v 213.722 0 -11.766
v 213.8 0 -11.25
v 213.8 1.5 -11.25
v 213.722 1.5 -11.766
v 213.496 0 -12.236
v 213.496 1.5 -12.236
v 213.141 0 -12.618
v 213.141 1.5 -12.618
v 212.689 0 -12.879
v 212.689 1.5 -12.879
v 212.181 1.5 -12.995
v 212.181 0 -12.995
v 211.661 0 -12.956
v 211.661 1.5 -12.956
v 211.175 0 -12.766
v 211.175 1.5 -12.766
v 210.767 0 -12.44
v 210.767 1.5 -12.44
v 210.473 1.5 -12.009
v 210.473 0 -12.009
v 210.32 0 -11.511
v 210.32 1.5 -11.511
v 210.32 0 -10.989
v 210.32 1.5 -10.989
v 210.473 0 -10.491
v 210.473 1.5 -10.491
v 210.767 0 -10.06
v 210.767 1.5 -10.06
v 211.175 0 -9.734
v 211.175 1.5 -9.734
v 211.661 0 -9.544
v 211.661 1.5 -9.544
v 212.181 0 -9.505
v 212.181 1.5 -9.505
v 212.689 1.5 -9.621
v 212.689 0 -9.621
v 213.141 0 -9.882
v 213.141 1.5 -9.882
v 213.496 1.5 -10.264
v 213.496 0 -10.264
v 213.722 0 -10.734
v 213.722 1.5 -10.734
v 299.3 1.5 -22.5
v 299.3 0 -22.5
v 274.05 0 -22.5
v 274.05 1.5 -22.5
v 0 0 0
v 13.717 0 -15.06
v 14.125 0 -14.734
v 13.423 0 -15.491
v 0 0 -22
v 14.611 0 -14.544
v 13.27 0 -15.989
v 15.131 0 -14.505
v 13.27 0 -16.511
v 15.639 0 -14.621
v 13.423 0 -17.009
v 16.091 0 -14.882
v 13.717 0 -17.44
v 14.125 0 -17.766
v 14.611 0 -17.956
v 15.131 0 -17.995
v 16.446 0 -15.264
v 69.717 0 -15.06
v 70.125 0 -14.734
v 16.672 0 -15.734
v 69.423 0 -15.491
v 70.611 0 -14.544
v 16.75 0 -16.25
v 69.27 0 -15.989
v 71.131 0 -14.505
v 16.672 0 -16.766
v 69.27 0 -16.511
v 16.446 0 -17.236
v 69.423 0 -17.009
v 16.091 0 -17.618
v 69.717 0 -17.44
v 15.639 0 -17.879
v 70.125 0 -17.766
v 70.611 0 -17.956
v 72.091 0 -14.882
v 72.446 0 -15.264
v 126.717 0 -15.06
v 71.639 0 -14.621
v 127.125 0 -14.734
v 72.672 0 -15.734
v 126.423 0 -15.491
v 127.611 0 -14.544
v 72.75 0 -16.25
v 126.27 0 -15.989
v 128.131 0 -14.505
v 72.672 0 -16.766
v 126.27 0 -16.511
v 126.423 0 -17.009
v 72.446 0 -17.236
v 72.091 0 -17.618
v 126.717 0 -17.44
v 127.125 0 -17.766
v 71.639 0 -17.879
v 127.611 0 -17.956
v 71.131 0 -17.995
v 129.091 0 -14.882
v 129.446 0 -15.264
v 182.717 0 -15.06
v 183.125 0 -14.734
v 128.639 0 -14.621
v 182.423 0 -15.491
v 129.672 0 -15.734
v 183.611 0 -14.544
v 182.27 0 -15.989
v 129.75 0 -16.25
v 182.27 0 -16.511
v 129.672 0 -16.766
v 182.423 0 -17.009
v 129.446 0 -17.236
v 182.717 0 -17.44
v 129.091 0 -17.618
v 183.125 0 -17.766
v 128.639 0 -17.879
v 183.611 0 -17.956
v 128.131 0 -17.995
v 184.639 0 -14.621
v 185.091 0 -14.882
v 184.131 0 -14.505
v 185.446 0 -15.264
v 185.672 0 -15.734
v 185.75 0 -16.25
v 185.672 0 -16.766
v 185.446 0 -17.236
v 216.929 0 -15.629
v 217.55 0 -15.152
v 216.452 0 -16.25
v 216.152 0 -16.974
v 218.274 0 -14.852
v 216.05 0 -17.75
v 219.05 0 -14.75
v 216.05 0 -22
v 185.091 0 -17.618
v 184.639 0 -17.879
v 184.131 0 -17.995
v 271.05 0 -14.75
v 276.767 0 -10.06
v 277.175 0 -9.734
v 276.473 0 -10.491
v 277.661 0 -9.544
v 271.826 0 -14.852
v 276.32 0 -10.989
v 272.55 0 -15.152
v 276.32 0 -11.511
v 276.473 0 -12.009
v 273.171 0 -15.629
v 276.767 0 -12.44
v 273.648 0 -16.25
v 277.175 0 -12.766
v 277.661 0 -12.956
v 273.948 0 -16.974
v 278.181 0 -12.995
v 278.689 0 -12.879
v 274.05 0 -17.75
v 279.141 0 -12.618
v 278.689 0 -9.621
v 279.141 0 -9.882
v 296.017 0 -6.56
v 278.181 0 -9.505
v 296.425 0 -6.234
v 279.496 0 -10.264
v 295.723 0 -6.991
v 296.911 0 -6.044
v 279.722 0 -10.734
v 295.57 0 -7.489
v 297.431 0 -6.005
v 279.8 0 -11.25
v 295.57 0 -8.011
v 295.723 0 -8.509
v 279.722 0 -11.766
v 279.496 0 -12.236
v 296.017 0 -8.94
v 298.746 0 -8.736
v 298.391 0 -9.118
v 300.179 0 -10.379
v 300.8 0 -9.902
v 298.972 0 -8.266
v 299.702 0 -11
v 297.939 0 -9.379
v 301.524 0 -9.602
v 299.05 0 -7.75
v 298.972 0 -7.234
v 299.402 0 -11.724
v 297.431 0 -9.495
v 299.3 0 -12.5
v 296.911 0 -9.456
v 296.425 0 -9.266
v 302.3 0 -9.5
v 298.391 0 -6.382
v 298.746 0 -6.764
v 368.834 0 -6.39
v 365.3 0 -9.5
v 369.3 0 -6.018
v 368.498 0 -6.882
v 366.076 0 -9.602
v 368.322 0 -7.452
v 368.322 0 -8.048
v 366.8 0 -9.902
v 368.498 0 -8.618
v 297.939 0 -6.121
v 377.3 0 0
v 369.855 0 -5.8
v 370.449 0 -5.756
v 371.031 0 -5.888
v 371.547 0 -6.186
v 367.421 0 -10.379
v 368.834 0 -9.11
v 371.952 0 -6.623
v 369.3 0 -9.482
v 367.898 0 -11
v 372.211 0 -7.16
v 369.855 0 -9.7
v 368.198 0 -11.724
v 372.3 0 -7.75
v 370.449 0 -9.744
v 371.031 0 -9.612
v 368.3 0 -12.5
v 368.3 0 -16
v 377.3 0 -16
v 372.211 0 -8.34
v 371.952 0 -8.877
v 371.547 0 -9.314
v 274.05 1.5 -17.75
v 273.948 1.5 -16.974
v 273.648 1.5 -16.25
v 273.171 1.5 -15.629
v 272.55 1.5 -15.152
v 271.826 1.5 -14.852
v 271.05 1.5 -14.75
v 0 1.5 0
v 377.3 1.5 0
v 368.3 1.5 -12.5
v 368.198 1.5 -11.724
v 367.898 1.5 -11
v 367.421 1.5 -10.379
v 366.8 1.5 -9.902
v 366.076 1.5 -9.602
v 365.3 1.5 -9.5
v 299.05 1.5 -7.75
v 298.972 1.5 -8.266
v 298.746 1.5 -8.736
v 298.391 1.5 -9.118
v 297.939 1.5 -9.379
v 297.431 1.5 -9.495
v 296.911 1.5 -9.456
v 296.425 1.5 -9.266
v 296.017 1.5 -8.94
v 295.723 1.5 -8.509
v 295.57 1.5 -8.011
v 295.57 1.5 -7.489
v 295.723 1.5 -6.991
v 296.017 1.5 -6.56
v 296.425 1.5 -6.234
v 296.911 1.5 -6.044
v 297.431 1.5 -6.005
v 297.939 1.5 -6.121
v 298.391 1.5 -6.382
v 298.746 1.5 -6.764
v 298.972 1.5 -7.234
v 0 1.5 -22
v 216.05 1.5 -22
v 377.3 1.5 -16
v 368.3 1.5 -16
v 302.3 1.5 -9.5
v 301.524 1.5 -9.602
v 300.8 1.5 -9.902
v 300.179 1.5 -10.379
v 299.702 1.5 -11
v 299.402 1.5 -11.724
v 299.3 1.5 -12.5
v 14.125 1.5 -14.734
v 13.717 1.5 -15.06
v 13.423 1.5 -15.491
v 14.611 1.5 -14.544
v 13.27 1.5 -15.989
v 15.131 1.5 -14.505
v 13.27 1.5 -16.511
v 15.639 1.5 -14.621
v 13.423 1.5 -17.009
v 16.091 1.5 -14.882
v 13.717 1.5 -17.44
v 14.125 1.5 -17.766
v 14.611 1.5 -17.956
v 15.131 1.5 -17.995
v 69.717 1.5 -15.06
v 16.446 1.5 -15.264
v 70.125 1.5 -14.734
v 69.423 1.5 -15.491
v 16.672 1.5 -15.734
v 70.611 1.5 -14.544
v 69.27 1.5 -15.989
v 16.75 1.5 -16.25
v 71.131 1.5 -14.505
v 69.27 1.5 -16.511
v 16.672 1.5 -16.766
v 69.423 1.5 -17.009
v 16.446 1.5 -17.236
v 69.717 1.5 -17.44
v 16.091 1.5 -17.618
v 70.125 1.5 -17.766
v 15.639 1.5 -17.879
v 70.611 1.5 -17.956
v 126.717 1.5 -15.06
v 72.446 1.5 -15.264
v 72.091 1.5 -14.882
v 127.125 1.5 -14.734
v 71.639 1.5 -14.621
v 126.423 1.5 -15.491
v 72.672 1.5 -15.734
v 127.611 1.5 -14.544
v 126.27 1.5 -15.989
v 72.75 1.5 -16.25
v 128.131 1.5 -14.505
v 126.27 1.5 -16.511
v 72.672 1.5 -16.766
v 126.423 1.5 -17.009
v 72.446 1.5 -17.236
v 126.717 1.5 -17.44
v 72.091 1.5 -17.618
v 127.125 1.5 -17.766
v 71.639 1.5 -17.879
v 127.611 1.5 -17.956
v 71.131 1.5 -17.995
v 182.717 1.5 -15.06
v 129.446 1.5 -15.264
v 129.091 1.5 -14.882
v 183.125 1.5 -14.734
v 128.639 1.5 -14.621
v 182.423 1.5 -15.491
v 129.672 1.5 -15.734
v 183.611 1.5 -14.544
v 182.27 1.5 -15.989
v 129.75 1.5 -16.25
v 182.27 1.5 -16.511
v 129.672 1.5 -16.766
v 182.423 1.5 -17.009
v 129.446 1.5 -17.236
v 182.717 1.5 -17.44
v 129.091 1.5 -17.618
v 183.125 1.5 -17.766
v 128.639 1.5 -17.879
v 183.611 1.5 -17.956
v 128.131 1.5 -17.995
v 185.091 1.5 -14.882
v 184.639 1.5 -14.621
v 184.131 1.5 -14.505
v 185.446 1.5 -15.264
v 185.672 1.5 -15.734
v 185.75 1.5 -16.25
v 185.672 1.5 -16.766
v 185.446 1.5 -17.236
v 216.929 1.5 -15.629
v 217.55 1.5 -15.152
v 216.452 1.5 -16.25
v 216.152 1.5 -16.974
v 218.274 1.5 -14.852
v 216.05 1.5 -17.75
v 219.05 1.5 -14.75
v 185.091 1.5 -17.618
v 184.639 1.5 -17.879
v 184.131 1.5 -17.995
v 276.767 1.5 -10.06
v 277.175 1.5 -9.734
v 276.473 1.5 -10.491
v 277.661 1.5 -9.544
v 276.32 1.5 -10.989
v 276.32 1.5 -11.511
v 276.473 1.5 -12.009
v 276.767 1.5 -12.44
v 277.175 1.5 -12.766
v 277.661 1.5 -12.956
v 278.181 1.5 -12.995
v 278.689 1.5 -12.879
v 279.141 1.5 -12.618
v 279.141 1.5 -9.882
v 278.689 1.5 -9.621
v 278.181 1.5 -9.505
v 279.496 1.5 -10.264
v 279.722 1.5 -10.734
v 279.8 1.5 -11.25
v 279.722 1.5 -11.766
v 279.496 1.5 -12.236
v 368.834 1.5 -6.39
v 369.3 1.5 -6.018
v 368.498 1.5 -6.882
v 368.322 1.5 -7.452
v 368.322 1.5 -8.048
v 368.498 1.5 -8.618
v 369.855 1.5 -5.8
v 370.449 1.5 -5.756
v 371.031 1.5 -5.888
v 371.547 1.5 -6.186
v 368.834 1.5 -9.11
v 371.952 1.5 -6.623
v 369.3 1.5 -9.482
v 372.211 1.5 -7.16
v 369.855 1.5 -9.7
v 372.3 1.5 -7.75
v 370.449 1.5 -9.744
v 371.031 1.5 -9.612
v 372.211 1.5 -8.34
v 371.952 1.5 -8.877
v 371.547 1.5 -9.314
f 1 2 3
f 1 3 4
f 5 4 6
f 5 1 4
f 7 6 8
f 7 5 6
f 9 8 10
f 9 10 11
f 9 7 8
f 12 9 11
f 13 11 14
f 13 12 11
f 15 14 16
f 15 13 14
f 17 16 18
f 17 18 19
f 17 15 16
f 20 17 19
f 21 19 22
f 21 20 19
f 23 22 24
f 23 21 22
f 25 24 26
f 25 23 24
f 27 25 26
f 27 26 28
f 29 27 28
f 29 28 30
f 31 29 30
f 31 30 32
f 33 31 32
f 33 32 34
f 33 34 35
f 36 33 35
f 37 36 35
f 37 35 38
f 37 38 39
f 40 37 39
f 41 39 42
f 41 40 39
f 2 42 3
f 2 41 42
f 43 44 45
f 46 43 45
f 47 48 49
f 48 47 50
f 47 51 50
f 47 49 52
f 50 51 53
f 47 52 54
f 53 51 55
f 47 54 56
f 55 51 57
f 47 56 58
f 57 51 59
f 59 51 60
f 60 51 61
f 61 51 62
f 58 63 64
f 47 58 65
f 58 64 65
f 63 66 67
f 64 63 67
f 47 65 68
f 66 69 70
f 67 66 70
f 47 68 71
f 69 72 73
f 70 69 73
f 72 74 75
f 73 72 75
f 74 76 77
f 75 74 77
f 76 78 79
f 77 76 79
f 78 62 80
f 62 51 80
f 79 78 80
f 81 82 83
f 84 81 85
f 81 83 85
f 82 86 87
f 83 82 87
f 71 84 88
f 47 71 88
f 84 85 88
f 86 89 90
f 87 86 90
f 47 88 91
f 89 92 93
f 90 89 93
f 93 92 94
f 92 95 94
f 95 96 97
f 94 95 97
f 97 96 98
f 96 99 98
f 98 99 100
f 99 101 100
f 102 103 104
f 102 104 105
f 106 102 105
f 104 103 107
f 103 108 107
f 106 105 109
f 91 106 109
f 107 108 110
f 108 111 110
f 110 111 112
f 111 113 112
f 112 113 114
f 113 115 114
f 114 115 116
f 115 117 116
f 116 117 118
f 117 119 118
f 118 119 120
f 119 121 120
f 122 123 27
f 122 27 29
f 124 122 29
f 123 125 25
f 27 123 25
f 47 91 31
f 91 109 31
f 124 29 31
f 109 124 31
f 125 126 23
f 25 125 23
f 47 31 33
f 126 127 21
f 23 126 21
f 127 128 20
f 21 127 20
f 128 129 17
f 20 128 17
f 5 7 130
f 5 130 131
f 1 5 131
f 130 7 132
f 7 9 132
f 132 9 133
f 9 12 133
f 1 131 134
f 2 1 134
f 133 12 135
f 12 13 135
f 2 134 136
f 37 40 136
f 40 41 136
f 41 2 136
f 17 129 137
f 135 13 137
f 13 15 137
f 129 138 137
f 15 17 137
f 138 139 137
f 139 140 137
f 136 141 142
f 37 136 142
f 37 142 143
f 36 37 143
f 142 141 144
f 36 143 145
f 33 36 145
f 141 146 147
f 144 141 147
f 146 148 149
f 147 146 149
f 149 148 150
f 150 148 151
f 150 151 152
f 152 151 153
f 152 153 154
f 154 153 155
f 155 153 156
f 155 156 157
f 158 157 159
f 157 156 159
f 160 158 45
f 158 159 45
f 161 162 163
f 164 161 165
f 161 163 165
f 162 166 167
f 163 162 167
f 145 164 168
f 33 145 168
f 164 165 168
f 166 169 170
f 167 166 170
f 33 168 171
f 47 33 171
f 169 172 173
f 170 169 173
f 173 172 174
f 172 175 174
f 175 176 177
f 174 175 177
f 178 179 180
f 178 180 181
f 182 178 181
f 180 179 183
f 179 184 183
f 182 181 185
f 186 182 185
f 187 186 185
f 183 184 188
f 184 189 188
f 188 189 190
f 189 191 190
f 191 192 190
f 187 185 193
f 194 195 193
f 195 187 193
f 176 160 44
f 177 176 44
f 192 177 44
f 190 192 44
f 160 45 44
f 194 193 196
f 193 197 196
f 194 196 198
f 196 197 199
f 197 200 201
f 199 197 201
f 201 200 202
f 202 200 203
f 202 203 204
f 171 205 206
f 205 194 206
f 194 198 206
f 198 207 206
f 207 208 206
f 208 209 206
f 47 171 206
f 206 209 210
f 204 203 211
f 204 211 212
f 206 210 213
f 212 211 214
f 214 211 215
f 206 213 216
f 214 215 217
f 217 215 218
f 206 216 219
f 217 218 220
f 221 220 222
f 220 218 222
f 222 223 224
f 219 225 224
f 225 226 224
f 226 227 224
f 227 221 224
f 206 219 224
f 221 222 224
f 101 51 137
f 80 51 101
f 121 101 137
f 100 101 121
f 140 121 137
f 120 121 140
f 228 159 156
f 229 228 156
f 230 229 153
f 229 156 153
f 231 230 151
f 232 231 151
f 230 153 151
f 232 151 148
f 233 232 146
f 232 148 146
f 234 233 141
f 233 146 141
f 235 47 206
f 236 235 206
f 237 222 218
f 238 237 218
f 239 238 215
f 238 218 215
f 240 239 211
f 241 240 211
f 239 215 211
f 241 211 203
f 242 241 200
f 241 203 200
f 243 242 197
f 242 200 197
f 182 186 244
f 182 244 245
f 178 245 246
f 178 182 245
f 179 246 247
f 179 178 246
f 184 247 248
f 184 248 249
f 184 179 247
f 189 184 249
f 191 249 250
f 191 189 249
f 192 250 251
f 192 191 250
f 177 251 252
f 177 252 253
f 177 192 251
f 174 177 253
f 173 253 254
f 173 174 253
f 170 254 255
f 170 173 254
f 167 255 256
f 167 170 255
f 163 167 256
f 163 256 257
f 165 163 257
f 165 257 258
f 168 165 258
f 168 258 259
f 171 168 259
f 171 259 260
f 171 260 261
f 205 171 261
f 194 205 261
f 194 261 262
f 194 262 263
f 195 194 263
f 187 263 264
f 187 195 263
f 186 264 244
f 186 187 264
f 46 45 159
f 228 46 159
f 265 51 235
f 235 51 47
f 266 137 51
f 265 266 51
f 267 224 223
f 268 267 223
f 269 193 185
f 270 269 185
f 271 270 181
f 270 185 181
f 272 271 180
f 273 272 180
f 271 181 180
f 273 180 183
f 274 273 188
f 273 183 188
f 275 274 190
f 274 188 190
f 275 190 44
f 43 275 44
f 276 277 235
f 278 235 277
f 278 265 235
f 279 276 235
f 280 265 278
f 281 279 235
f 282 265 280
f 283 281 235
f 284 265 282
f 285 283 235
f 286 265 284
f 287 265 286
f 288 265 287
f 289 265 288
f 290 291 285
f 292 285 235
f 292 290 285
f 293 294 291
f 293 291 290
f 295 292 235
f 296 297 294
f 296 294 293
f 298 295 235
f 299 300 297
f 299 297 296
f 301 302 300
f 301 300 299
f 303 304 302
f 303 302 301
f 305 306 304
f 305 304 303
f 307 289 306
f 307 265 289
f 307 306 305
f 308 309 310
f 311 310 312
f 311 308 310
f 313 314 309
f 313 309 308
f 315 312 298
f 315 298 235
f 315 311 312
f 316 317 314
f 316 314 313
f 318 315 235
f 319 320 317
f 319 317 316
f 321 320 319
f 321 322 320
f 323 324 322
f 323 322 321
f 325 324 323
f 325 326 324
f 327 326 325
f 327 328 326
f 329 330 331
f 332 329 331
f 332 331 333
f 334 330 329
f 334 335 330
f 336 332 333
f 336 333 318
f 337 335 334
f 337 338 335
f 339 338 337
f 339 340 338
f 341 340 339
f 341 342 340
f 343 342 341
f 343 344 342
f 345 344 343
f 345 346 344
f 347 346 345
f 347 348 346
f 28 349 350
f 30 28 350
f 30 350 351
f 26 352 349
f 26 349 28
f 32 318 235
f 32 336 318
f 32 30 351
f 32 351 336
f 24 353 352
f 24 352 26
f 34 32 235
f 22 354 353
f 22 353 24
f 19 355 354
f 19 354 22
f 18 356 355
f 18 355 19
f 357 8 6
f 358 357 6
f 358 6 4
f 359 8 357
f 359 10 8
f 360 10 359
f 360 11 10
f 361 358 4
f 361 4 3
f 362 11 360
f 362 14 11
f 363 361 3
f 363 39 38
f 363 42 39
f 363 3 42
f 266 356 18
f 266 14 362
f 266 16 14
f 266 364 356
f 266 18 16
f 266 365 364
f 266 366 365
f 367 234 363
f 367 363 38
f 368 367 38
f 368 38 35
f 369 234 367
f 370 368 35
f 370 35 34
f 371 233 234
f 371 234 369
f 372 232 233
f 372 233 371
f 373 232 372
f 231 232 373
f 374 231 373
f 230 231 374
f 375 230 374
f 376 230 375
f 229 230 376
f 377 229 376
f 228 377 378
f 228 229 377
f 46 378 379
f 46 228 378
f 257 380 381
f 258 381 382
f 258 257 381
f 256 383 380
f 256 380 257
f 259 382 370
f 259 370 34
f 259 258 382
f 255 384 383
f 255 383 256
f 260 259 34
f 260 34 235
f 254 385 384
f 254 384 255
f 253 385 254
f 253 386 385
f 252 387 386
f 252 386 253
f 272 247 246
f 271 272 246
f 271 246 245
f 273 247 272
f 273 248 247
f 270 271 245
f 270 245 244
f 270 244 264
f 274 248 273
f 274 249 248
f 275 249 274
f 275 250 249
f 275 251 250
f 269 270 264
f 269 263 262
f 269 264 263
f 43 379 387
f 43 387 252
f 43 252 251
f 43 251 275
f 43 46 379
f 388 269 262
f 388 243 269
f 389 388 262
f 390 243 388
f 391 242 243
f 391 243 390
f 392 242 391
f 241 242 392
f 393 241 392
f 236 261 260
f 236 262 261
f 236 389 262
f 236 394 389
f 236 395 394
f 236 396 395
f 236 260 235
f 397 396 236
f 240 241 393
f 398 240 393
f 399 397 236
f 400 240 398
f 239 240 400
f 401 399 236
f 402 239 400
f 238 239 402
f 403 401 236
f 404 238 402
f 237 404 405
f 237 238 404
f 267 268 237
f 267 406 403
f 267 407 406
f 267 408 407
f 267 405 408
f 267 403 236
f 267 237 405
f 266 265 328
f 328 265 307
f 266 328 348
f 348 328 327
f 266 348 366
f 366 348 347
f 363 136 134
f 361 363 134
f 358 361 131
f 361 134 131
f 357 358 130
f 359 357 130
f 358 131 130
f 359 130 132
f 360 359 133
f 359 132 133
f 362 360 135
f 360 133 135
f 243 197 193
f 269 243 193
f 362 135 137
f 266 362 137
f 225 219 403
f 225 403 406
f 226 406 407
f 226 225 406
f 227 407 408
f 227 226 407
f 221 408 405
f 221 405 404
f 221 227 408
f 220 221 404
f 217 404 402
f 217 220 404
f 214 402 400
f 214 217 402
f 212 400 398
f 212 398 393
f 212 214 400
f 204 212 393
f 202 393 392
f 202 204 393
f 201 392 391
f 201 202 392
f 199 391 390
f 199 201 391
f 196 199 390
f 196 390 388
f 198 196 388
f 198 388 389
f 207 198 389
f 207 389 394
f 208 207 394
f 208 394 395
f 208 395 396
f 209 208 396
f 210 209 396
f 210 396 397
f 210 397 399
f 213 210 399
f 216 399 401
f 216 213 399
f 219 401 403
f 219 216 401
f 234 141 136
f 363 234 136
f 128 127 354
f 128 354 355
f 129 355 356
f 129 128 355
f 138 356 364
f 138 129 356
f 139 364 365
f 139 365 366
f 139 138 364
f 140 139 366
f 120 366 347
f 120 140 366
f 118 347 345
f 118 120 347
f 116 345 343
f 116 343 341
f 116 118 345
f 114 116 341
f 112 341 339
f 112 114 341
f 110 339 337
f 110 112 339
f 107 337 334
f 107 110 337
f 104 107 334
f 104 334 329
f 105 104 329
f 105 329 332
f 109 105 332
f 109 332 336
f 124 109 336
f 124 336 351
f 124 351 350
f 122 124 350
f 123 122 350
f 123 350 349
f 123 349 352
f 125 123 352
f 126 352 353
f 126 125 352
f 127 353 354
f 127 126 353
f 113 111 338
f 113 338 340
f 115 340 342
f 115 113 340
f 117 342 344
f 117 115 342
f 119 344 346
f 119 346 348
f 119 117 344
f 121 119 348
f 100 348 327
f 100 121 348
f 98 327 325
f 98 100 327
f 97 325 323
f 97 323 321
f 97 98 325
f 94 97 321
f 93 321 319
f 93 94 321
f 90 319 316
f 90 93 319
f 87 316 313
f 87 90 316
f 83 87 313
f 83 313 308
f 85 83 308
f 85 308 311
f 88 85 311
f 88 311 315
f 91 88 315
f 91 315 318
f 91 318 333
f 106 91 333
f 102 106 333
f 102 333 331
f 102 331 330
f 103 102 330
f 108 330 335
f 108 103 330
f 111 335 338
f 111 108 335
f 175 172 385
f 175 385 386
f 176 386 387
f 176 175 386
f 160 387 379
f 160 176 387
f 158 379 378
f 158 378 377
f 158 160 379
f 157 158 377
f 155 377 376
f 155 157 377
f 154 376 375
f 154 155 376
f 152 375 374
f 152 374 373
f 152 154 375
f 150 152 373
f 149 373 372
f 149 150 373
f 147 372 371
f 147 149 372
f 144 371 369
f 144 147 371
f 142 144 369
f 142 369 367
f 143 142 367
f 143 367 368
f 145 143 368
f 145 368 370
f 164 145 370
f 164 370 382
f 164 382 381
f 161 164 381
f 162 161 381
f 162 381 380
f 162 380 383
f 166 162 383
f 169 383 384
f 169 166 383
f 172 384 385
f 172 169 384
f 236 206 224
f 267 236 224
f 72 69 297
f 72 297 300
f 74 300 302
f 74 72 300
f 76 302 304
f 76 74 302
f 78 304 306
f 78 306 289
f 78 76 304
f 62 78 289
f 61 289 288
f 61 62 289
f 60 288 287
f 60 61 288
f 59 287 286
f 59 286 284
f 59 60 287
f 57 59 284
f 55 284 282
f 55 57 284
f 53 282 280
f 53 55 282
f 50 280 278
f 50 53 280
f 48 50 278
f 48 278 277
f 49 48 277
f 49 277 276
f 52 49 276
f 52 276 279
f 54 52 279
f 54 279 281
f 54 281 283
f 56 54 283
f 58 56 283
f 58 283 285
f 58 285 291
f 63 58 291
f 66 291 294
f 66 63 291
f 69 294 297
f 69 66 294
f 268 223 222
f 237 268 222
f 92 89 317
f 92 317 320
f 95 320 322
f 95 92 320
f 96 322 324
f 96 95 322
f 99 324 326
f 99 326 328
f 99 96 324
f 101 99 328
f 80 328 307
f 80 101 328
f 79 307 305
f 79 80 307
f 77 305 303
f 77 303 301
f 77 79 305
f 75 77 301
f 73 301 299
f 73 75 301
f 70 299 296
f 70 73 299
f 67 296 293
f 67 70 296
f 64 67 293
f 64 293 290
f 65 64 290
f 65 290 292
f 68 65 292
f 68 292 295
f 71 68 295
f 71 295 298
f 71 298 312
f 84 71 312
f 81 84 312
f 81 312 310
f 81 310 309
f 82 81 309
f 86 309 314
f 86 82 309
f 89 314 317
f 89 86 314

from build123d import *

# Parameters (mm, degrees)
SKETCH_1_R      = 1.75
SKETCH_1_R_2    = 2
EXTRUDE_1_DEPTH = 1.5


with BuildPart() as part:
    # Эскиз1 → Бобышка-Вытянуть1 (new body)
    with BuildSketch(Plane(origin=(0, 0, 0), x_dir=(1, 0, 0), z_dir=(0, 1, 0))):
        with BuildLine():
            Line((299.3, 12.5), (299.3, 22.5))
            Line((299.3, 22.5), (274.05, 22.5))
            Line((274.05, 22.5), (274.05, 17.75))
            ThreePointArc((274.05, 17.75), (273.171320344, 15.628679656), (271.05, 14.75))
            Line((271.05, 14.75), (219.05, 14.75))
            ThreePointArc((219.05, 14.75), (216.928679656, 15.628679656), (216.05, 17.75))
            Line((216.05, 17.75), (216.05, 22))
            Line((216.05, 22), (0, 22))
            Line((0, 22), (0, 0))
            Line((0, 0), (377.3, 0))
            Line((377.3, 0), (377.3, 16))
            Line((377.3, 16), (368.3, 16))
            Line((368.3, 16), (368.3, 12.5))
            ThreePointArc((368.3, 12.5), (367.421320344, 10.378679656), (365.3, 9.5))
            Line((365.3, 9.5), (302.3, 9.5))
            ThreePointArc((302.3, 9.5), (300.178679656, 10.378679656), (299.3, 12.5))
        make_face()
        with Locations((212.05, 11.25)):
            Circle(SKETCH_1_R, mode=Mode.SUBTRACT)
        with Locations((278.05, 11.25)):
            Circle(SKETCH_1_R, mode=Mode.SUBTRACT)
        with Locations((297.3, 7.75)):
            Circle(SKETCH_1_R, mode=Mode.SUBTRACT)
        with Locations((370.3, 7.75)):
            Circle(SKETCH_1_R_2, mode=Mode.SUBTRACT)
        with Locations((15, 16.25)):
            Circle(SKETCH_1_R, mode=Mode.SUBTRACT)
        with Locations((71, 16.25)):
            Circle(SKETCH_1_R, mode=Mode.SUBTRACT)
        with Locations((128, 16.25)):
            Circle(SKETCH_1_R, mode=Mode.SUBTRACT)
        with Locations((184, 16.25)):
            Circle(SKETCH_1_R, mode=Mode.SUBTRACT)
    extrude(amount=EXTRUDE_1_DEPTH)


solid = part.part
